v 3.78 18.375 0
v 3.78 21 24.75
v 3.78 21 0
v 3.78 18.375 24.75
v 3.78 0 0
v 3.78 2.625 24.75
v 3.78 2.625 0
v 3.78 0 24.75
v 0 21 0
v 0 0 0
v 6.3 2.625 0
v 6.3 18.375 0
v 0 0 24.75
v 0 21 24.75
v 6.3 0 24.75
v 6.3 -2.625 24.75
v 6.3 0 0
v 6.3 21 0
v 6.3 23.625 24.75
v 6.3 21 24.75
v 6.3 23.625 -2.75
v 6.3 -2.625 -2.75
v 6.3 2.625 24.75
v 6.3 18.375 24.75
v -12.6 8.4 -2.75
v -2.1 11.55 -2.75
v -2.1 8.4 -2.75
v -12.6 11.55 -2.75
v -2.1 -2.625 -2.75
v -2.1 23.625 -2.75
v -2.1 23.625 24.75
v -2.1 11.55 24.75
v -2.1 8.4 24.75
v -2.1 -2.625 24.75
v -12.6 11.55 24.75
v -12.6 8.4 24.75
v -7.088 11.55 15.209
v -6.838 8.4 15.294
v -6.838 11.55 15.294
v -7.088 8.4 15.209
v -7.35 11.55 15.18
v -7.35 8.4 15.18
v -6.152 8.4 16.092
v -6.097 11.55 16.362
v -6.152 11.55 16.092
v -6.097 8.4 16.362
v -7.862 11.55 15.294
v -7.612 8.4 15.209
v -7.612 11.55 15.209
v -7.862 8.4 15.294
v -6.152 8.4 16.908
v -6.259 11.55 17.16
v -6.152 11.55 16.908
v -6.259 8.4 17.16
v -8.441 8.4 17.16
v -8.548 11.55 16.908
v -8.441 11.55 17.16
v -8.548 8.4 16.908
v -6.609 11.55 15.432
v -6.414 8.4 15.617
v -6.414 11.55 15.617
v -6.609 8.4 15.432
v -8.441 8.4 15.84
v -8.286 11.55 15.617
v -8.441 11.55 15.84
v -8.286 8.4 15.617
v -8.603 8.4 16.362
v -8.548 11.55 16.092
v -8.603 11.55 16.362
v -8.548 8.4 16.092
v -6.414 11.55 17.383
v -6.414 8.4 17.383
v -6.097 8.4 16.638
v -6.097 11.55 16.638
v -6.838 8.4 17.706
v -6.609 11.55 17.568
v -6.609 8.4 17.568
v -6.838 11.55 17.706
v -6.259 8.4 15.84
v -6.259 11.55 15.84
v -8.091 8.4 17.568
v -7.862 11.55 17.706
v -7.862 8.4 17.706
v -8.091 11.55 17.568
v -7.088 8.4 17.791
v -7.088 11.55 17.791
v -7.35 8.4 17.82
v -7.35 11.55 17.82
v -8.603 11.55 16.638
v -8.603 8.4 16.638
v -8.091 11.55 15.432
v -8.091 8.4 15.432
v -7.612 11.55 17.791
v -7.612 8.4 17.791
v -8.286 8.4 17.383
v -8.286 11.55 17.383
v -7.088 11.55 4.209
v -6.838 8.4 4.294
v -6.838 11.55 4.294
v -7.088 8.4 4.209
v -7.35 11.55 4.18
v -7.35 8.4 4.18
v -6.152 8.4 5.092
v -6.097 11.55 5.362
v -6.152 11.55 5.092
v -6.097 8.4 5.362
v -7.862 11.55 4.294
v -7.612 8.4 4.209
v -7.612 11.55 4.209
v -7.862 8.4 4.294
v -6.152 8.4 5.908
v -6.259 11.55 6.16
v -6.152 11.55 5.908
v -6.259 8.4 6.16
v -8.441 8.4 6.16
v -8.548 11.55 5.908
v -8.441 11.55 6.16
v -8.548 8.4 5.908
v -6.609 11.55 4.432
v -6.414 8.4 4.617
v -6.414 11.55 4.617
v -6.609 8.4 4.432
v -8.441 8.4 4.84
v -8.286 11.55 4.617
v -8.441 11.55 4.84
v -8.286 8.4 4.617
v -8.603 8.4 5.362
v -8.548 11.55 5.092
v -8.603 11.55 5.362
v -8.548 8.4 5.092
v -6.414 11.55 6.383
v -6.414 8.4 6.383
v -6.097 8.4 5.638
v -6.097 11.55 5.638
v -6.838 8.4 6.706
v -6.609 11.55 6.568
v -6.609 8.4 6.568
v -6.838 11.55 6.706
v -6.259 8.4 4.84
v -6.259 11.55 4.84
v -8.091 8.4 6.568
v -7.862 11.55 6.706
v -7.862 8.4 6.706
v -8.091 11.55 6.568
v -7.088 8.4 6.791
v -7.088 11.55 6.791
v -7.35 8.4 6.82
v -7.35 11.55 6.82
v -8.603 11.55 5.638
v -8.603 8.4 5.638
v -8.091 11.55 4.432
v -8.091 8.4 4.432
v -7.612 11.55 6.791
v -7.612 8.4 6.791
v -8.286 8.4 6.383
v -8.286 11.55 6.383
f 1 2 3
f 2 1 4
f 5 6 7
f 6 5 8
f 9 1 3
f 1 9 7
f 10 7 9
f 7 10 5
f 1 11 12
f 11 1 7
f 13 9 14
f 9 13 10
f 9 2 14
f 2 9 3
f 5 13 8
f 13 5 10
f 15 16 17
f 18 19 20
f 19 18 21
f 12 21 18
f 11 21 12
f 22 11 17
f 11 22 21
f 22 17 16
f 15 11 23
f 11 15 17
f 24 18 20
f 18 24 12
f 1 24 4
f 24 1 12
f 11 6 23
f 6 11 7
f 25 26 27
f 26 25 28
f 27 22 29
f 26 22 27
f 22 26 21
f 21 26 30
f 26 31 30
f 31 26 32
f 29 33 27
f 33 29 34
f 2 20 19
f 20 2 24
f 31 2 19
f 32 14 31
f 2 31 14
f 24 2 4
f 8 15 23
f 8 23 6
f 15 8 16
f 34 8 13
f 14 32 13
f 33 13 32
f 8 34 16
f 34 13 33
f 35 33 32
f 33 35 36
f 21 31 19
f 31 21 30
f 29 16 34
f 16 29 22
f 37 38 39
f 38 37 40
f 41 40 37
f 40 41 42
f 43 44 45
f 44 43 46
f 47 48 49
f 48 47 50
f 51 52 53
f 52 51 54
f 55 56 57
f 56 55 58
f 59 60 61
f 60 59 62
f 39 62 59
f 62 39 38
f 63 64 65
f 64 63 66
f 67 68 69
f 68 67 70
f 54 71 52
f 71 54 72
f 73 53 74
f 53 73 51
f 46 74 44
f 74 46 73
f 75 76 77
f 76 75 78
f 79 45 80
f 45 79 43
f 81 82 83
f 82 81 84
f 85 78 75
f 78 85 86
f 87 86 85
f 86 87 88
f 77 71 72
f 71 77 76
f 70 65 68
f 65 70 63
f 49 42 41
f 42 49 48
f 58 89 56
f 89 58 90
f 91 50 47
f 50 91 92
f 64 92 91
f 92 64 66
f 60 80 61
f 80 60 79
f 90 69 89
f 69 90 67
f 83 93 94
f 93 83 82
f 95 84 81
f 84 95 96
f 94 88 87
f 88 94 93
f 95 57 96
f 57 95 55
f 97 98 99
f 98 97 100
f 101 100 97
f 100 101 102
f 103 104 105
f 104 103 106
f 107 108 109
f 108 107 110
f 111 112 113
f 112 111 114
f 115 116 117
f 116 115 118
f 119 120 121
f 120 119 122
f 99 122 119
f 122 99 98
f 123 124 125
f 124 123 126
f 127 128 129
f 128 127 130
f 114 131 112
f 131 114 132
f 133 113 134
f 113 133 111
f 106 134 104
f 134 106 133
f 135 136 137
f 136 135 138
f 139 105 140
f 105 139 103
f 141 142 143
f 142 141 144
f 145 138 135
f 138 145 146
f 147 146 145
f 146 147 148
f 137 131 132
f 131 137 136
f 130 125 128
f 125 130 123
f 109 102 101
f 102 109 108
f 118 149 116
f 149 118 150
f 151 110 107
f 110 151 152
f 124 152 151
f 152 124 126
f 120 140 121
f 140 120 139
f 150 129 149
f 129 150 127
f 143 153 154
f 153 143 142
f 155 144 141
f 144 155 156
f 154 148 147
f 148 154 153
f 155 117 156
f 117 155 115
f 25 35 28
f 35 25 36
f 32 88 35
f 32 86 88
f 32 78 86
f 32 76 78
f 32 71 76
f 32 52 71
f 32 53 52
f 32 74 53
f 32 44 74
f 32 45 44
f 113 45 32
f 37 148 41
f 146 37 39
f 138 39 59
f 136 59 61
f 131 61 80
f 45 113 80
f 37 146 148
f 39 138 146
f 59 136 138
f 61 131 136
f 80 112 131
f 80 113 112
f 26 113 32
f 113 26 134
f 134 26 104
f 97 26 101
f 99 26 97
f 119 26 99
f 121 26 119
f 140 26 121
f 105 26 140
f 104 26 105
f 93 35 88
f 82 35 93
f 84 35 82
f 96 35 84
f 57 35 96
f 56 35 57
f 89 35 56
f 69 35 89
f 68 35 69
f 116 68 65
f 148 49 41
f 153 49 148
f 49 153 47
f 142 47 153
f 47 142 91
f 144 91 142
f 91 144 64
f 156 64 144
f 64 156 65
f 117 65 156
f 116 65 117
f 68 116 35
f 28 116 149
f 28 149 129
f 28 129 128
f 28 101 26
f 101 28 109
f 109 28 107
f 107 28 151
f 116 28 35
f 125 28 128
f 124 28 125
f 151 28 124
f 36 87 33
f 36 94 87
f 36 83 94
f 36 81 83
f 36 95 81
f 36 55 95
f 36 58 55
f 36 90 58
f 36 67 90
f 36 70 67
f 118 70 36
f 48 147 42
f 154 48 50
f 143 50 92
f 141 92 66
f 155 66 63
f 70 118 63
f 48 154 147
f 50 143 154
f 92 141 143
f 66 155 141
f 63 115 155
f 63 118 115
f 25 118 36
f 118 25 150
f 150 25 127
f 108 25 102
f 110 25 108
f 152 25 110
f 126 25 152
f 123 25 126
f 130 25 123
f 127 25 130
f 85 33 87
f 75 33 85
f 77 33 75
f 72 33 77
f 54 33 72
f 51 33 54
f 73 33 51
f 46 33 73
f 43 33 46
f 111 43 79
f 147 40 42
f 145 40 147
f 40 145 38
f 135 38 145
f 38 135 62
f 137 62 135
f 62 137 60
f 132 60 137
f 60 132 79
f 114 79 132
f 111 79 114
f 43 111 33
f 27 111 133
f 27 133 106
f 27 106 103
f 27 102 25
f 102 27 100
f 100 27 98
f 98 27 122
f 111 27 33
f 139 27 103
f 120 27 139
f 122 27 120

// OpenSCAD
scale([1.05,1.05,1.1])
rotate([0,90,0])
{

difference()
{

translate([-2.5-20,-2.5,-2])
cube([25,25,8]);


rotate([0,-90,0])
union()
{
cube([3.6,20,24]);
translate([3,2.5,0])
cube([3,15,24]);
translate([6,0,0])
cube([3,20,24]);
}

}

difference()
{
translate([-25+2.5,8,-12])
cube([25,3,10]);


union()
{
translate([-15,13,-7])
rotate([90,0,0])
cylinder(r=1.2, h=40, $fn=30);

translate([-5,13,-7])
rotate([90,0,0])
cylinder(r=1.2, h=40, $fn=30);


}

}


}
